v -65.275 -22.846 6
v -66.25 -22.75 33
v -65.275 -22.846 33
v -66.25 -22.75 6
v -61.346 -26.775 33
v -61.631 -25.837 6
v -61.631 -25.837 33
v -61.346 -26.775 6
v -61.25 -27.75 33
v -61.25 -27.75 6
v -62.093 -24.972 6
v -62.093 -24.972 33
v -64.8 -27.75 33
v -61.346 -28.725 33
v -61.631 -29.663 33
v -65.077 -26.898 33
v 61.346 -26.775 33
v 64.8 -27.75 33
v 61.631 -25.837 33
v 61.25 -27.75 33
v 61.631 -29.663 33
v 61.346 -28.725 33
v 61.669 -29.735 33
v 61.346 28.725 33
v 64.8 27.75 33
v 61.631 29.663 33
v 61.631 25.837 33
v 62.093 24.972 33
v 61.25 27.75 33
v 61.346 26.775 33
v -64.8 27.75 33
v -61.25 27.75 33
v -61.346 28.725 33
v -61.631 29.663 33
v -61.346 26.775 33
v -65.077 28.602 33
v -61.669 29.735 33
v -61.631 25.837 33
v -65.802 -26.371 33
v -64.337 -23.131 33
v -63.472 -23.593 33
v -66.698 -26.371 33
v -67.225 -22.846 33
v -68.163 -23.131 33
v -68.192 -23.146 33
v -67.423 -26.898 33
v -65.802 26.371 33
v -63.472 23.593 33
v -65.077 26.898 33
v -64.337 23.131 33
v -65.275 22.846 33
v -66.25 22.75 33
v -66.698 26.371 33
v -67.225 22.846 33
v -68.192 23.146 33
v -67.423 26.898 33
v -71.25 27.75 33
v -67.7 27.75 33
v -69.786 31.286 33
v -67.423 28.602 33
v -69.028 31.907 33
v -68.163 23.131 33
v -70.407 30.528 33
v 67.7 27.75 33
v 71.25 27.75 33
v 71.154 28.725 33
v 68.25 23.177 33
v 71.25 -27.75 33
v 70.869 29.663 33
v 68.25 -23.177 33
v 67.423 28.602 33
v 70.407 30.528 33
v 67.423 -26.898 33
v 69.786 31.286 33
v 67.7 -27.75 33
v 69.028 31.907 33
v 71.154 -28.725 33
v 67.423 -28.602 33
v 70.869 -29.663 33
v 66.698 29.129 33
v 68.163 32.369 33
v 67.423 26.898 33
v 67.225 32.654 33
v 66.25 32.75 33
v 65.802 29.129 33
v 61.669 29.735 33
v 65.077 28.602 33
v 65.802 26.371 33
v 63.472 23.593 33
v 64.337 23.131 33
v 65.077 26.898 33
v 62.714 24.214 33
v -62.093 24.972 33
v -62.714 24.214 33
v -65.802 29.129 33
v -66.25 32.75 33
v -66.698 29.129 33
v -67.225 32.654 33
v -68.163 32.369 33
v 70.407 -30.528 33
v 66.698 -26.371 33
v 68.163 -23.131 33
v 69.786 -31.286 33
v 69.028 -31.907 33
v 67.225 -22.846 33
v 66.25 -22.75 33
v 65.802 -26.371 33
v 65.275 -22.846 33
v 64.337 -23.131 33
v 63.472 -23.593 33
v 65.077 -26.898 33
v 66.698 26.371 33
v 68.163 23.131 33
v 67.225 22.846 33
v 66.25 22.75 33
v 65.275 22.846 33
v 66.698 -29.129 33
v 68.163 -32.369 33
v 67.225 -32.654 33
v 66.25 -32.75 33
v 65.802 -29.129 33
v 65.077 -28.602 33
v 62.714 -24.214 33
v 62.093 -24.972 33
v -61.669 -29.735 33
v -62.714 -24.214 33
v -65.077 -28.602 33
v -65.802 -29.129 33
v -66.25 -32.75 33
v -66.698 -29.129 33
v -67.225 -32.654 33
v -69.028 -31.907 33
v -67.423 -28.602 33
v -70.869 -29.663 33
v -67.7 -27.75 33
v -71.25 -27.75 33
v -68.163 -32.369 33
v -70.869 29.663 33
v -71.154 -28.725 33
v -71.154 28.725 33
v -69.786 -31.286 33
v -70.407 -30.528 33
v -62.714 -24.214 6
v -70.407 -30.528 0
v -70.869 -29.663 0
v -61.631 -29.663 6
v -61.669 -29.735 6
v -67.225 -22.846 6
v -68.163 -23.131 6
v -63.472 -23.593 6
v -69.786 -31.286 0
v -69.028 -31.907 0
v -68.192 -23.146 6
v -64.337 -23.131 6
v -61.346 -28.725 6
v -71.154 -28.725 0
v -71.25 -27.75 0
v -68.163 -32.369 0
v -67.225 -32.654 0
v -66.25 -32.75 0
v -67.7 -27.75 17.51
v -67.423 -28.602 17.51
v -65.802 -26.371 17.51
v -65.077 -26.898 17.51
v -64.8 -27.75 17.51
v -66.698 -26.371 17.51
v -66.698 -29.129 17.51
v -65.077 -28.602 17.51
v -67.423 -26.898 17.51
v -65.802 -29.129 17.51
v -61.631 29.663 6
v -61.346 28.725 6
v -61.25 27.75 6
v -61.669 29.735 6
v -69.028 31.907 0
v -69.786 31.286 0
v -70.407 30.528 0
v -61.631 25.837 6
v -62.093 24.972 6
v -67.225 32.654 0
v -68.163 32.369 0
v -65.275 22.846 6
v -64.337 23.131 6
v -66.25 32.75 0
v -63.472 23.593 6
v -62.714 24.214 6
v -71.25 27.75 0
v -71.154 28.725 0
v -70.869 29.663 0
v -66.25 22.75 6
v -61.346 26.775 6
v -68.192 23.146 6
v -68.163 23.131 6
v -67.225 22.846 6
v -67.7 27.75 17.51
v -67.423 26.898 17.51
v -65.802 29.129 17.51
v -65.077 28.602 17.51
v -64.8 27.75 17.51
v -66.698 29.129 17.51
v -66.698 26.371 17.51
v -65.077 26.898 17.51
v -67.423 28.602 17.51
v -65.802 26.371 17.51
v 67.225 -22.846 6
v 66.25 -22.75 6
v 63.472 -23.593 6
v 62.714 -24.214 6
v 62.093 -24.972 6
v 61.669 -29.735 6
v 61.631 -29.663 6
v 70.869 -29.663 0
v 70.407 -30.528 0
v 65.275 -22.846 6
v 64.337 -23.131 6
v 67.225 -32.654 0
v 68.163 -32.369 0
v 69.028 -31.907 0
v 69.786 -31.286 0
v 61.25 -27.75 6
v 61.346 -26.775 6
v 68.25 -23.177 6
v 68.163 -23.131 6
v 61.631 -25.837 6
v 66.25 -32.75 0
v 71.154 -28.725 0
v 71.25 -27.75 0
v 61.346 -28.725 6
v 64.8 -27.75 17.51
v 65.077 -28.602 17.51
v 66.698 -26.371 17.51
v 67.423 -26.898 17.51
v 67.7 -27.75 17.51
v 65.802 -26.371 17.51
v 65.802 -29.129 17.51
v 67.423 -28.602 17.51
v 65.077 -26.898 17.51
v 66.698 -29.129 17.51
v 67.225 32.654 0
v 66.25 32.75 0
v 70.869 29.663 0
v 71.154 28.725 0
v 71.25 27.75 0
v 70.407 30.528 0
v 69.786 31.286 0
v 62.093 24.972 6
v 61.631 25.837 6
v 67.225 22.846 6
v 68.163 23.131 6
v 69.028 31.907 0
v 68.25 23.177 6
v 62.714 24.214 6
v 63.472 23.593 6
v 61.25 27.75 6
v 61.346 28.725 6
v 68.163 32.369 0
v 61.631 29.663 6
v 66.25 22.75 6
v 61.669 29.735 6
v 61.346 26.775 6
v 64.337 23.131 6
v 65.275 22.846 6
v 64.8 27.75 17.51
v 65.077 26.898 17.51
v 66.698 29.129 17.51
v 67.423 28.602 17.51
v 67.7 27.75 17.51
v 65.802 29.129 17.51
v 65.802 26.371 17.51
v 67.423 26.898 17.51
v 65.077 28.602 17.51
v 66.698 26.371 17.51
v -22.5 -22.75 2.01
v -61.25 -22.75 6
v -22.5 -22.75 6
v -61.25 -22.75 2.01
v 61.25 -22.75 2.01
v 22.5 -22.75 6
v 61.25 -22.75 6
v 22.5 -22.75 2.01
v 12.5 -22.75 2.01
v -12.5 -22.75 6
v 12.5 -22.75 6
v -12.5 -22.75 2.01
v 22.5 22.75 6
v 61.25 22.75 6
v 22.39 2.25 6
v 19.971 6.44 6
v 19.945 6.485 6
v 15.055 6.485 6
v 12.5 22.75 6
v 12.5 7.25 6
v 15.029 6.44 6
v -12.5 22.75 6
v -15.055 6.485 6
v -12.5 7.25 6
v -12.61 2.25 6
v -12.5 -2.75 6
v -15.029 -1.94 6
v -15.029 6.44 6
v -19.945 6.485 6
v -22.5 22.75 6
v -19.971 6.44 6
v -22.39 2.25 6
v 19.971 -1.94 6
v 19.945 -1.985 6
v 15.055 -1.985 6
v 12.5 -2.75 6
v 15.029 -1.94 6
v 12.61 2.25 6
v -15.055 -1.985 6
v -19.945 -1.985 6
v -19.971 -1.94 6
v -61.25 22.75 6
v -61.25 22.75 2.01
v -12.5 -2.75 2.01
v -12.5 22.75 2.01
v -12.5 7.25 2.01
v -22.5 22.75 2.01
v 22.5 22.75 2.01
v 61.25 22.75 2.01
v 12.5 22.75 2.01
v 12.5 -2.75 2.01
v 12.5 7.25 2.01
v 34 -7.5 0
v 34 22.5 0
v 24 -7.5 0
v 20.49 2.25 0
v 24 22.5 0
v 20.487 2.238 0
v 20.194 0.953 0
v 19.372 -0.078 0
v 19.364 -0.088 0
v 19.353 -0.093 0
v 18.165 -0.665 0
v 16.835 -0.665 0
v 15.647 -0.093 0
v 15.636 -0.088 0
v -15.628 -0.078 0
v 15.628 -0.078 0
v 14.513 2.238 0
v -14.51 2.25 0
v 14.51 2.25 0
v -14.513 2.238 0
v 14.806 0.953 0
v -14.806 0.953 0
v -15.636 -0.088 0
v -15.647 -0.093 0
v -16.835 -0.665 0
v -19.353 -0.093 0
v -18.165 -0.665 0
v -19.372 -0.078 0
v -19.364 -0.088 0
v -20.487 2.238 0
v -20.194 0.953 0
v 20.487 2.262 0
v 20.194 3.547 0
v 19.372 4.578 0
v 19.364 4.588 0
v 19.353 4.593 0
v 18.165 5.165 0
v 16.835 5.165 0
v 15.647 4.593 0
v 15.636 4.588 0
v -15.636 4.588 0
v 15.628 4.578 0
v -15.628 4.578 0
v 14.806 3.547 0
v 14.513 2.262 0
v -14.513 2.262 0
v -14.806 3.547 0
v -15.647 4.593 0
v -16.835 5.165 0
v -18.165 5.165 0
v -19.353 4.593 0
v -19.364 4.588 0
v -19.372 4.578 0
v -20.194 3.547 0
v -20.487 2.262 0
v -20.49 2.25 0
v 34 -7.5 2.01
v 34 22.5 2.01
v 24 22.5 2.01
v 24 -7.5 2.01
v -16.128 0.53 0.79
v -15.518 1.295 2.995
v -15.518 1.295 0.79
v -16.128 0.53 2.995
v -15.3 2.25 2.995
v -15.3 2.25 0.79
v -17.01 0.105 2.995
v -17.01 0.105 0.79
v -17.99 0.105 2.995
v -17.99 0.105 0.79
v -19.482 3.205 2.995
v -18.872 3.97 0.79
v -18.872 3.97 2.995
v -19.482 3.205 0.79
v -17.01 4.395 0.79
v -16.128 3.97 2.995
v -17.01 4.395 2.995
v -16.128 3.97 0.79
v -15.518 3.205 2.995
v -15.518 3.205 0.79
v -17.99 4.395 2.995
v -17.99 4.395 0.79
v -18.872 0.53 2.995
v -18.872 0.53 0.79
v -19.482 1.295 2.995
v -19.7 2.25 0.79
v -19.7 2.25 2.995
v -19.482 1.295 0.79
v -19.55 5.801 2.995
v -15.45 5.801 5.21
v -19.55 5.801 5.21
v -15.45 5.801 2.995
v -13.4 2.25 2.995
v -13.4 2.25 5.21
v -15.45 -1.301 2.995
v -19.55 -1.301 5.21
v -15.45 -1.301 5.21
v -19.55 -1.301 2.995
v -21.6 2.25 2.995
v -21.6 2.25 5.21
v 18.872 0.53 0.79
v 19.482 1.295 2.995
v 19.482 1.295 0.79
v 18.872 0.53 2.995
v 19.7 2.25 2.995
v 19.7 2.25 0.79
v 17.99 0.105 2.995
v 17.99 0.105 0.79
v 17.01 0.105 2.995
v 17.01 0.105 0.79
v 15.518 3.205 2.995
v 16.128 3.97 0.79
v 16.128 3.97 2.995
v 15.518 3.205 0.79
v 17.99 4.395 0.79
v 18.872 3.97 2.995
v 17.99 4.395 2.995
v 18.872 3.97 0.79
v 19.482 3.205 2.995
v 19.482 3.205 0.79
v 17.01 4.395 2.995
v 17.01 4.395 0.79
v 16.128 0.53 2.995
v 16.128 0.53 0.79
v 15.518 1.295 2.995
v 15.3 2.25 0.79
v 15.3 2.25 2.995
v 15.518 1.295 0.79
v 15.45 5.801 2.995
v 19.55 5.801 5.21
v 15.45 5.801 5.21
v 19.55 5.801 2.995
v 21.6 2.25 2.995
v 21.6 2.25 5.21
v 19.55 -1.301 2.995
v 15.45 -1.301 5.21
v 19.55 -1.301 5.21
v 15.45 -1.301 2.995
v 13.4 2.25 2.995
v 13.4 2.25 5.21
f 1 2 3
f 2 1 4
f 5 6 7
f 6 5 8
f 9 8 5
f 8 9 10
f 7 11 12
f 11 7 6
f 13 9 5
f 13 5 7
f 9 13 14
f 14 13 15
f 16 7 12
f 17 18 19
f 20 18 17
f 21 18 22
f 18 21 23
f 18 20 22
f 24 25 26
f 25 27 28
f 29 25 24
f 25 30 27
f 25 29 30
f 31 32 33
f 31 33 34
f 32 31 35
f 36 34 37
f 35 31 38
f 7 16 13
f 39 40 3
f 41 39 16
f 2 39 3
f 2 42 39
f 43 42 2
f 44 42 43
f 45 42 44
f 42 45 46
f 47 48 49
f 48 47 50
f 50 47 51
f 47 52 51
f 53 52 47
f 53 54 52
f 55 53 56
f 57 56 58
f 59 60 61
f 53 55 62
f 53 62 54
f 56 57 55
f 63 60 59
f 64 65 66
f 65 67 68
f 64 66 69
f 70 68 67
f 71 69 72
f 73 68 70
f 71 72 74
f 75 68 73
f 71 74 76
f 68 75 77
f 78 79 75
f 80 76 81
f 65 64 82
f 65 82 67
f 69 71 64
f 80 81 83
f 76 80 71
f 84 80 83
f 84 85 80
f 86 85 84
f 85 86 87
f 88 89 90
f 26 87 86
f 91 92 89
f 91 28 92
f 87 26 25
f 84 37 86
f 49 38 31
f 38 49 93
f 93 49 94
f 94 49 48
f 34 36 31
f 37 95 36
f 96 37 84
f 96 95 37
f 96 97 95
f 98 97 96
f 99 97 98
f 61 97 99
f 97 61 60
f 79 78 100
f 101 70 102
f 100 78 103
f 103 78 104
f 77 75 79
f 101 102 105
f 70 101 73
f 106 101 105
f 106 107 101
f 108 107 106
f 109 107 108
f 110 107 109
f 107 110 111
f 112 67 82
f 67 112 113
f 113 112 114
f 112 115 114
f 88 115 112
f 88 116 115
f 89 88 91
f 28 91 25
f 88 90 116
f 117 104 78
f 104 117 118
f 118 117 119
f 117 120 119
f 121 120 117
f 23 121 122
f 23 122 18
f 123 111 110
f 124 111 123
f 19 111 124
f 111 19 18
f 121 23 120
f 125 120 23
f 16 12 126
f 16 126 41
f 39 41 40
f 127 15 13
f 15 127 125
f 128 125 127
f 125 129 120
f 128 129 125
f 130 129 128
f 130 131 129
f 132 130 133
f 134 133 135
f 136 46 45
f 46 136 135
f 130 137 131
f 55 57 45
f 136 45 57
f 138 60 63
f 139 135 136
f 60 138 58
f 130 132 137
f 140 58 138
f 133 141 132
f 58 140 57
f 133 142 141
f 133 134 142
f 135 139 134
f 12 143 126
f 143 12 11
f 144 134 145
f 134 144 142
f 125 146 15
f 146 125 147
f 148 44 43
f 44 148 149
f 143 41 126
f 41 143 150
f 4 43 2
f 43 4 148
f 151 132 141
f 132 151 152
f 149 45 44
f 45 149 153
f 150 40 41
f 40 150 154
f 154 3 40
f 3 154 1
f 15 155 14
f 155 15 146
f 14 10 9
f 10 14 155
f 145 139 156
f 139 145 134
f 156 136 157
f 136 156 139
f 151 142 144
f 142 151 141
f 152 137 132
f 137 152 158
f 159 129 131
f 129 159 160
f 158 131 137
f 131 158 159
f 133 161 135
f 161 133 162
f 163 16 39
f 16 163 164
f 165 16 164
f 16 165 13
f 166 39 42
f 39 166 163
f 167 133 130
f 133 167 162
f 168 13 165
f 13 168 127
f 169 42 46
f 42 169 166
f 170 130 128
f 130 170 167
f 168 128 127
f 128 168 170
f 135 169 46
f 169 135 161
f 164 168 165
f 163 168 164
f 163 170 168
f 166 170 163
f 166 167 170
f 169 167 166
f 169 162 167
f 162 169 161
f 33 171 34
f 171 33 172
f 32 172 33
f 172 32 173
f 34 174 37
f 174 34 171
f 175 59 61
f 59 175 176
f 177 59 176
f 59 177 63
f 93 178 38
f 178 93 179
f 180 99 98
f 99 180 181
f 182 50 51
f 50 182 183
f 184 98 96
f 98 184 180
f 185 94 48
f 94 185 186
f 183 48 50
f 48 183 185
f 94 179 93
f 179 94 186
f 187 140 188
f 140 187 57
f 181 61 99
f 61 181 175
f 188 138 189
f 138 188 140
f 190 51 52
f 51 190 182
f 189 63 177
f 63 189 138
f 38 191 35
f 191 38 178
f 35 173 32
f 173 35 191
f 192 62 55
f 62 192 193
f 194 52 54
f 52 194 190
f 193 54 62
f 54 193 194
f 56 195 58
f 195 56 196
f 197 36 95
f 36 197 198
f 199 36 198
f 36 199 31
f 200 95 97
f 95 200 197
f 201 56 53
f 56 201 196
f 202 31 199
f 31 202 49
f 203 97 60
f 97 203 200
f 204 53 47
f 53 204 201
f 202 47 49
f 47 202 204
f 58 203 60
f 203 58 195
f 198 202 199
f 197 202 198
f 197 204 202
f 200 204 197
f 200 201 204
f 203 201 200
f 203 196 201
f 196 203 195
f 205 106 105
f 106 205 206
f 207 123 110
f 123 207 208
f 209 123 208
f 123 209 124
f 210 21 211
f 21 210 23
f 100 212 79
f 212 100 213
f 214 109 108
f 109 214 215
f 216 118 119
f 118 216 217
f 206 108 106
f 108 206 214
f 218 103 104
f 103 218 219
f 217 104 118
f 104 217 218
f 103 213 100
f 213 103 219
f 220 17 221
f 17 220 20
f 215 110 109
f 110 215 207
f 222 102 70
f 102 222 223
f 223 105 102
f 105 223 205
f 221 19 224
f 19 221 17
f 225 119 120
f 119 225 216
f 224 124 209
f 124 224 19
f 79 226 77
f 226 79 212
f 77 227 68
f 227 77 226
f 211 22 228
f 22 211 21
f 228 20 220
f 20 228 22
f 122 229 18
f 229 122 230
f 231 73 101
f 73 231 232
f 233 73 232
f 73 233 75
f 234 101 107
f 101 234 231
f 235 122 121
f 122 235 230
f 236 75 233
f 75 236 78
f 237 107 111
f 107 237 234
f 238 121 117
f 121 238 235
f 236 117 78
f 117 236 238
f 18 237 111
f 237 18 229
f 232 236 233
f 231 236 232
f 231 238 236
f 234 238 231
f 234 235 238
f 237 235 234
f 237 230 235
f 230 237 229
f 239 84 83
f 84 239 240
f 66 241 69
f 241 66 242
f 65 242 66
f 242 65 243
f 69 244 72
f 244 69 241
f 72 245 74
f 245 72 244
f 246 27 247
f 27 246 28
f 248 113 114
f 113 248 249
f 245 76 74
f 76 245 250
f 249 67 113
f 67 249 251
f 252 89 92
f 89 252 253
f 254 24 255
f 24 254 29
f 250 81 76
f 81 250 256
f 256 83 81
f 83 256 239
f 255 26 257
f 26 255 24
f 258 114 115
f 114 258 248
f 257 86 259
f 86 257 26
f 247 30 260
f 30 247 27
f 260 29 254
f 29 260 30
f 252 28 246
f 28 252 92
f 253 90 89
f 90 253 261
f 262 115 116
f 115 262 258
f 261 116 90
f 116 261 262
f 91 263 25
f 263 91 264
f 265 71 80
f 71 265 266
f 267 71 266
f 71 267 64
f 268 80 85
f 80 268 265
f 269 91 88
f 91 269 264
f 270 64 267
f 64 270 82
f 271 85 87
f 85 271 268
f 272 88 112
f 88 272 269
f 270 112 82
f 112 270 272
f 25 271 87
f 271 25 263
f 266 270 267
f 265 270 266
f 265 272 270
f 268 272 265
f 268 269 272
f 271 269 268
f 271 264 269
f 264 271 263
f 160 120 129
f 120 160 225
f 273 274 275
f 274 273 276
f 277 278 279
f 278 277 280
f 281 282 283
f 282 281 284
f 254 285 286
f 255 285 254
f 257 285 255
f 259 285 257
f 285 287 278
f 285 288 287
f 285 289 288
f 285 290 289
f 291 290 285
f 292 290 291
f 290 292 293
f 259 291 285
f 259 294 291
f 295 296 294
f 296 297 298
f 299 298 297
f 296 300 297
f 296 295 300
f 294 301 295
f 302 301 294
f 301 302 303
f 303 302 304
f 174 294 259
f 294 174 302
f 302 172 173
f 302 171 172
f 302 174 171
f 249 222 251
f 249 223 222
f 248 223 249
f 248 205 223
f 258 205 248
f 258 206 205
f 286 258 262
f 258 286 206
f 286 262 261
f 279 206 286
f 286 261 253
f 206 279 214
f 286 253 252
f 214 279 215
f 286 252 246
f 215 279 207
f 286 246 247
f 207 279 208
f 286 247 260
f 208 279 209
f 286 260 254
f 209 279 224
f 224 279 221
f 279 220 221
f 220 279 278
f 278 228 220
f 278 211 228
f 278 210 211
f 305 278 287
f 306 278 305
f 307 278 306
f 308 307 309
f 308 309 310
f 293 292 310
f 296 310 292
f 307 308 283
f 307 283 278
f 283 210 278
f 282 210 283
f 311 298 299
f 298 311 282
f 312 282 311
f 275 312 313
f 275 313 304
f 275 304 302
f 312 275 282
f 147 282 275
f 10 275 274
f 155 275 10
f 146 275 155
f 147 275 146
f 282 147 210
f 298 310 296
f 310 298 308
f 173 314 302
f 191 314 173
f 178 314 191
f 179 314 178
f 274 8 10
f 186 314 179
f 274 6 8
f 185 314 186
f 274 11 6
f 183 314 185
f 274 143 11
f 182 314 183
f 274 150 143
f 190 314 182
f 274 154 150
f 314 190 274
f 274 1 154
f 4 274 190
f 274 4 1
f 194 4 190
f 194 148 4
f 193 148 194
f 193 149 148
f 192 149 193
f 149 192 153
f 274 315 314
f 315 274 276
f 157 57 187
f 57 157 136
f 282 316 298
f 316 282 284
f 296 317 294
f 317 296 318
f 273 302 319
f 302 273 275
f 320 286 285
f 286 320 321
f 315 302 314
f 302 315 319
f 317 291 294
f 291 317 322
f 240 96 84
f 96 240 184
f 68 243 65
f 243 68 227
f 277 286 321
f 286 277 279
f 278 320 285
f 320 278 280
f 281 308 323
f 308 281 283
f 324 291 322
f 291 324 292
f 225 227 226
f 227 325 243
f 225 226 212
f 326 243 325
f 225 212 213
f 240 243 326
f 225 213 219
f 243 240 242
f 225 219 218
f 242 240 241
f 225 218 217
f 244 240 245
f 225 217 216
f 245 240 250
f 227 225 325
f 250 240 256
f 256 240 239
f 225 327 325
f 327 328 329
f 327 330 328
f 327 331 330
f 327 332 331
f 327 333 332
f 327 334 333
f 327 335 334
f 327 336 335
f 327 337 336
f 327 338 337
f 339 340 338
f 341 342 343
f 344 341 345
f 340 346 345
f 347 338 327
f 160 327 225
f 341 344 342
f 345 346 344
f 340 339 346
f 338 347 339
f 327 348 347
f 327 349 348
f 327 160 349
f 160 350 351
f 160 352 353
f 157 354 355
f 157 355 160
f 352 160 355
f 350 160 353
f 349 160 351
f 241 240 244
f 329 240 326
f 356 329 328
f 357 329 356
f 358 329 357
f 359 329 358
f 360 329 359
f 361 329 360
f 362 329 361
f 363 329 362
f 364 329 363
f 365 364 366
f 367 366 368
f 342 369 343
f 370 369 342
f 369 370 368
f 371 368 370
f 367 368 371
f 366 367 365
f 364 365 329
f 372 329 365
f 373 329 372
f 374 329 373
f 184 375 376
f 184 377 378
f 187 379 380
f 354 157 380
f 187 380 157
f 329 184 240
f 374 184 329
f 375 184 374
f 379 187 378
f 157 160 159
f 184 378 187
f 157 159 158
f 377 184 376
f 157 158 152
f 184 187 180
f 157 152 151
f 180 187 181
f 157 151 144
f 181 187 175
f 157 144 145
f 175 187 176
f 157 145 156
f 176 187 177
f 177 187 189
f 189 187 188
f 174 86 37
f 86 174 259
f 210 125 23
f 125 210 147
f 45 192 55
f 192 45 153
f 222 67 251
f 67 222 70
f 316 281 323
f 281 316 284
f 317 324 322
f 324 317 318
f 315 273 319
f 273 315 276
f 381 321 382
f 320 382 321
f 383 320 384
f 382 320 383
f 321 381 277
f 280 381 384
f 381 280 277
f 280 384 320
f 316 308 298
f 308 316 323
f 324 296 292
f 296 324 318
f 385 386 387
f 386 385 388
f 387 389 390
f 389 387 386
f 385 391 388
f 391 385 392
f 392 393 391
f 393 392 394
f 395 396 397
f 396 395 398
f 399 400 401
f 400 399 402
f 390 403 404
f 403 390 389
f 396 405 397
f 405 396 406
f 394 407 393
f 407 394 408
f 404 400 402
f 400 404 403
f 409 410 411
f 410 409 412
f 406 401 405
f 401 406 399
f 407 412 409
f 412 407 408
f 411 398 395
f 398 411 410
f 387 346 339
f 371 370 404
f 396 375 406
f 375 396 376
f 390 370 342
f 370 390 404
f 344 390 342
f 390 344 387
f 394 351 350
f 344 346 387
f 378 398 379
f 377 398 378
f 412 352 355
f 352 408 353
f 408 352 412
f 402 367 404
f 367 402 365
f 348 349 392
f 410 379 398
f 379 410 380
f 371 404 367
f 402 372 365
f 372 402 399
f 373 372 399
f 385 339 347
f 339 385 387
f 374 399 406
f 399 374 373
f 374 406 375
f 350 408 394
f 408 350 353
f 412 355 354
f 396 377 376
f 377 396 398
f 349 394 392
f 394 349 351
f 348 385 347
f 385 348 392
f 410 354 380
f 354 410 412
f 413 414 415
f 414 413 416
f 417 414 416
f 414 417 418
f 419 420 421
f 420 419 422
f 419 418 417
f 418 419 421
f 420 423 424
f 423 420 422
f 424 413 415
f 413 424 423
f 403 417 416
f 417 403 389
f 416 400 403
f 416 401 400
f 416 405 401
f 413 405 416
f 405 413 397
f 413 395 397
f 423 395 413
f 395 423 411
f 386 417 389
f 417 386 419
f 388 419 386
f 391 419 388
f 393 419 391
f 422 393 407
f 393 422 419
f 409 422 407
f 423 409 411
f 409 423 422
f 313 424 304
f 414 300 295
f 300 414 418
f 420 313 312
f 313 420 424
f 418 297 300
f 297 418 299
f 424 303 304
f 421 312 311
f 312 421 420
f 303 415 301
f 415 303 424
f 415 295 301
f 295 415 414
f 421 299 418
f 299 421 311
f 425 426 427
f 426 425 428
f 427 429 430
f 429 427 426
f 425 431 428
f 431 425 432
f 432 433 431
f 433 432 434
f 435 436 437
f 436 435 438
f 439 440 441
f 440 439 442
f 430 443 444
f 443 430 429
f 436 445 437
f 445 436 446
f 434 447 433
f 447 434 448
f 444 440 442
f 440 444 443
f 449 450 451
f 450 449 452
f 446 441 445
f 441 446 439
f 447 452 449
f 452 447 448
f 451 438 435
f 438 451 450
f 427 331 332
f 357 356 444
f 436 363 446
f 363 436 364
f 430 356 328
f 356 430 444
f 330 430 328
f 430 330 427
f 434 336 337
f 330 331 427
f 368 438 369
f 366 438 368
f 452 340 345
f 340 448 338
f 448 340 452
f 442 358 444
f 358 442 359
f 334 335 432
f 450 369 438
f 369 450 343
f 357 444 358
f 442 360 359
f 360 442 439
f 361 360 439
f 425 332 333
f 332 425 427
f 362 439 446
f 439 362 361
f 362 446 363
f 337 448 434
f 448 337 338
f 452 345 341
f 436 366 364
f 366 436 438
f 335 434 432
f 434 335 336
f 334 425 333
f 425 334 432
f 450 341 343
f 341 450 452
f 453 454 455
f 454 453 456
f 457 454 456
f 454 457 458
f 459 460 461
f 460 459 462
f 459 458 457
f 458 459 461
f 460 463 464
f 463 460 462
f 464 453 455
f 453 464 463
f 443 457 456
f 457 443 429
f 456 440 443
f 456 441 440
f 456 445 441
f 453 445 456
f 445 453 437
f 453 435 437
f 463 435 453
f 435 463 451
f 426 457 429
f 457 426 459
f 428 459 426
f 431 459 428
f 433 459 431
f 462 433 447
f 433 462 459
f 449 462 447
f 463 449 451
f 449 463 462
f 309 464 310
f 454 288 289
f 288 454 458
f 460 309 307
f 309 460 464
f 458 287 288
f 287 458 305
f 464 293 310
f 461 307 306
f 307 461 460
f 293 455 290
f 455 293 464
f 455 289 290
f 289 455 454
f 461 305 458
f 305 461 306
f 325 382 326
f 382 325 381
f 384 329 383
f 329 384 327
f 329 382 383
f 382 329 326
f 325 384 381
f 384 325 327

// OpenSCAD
include <cloverplus_v3_utils.scad>;

//---------------------------------------------------------------------------------------------------- 
// CloverPlus v3 Panucatt Viki2 GLCD case (mpeterson333/@/gmail.com)
//---------------------------------------------------------------------------------------------------- 
// This is a case for the Panucatt Viki2 GLCD that mounts to the top frame using mount_bracket()
// from cloverplus_v3_glcd_case_back_and_mount.scad
// 2x M4x12 screws and 2x M4 lock nuts are used to fix the case to the mount and 2x M4x16 screws are 
// used to fix the mount to the frame.  4x M3x6mm - M3x10 screws are used to fix the Viki2 to the case.
//---------------------------------------------------------------------------------------------------- 

$fs = 1;
$fa = 1;

// Screw spacing for the viki2 M3 screw holes
screw_spacing_x = 132.5;
screw_spacing_y = 55.5;

// Case frame thickness
edge_thick = 3;

// Bottom thickness
bottom_t = 2;

// Bracing thickness
brace_t = 4;

post_d = 10;

// Height not including bottom_t
height = 31;

// Cable pass-through hole sizing
cable_pass_hole_x = 10;
cable_pass_hole_y = 30;

// cable pass-through offsets from case center
cable_pass_hole_x_offset = 29;
cable_pass_hole_y_offset = 7.5;

// Spacing of the case to mount holes
mount_hole_spacing = 35;

// Offset from bottom of case to locate frame mount bracket holes
mount_hole_y_offset = 40;

// Mount hole and nuttrap depth
mount_hole_depth = bottom_t+1;
mount_nuttrap_depth = brace_t-1;

ff = 0.01;

case_frame();


module case_frame()
{
  difference()
  {
    union()
    {
      for(i = [-1,1])
      {
        // Viki M3 mount posts
        for(j = [-1,1])
          translate([i*screw_spacing_x*0.5, j*screw_spacing_y*0.5, height*0.5+bottom_t])
            difference()
            {
              cylinder(h=height, d=post_d, center=true);
              translate([0, 0, height*0.25+ff])
                cylinder(h=height*0.5, d=m3_tight_hole_d, center=true);
            }
        // Bracing
        translate([0, i*screw_spacing_y*0.5, brace_t*0.5+bottom_t])
          hull()
            for(j = [-1,1])
              translate([j*screw_spacing_x*0.5, 0, 0])
                cylinder(h=brace_t, d=post_d, center=true);
        translate([i*screw_spacing_x*0.5, 0, brace_t*0.5+bottom_t])
          hull()
            for(j = [-1,1])
              translate([0, j*screw_spacing_y*0.5, 0])
                cylinder(h=brace_t, d=post_d, center=true);
        translate([i*mount_hole_spacing*0.5, 0, brace_t*0.5+bottom_t])
          hull()
            for(j = [-1,1])
              translate([0, j*screw_spacing_y*0.5, 0])
                cylinder(h=brace_t, d=post_d, center=true);
      }

      // Mount hole brace
      translate([0, -(screw_spacing_y*0.5+post_d)+mount_hole_y_offset, ])
        hull()
          for(i = [-1, 1])
            translate([i*mount_hole_spacing*0.5, 0, brace_t*0.5+bottom_t])
              cylinder(h=brace_t, d=post_d, center=true);

      // Frame shell
      difference()
      {
        basic_frame(screw_spacing_x, screw_spacing_y, post_d, height + bottom_t);
        translate([0, 0, bottom_t+ff])
          basic_frame(screw_spacing_x, screw_spacing_y, post_d-edge_thick*2, height);
      }
    }

    // nuttraps for case to mount
    for(i = [-1, 1])
      translate([i*mount_hole_spacing*0.5, -(screw_spacing_y*0.5+post_d)+mount_hole_y_offset, bottom_t+brace_t])
        rotate([180,0,0])
          nuttrap(m4_hole_d, mount_hole_depth, m4_nuttrap_d, mount_nuttrap_depth);

    // Cable pass-through
    translate([cable_pass_hole_x_offset, cable_pass_hole_y_offset, brace_t])
      cube([cable_pass_hole_x, cable_pass_hole_y, (brace_t+bottom_t)*2], center=true);
  }
}


module basic_frame(x_spacing, y_spacing, edge_d, height)
{
  hull()
  {
    for(i = [-1,1])
      for(j = [-1,1])
        translate([i*x_spacing*0.5, j*y_spacing*0.5, height*0.5])
          cylinder(h=height, d=edge_d, center=true);
  }
      
}
